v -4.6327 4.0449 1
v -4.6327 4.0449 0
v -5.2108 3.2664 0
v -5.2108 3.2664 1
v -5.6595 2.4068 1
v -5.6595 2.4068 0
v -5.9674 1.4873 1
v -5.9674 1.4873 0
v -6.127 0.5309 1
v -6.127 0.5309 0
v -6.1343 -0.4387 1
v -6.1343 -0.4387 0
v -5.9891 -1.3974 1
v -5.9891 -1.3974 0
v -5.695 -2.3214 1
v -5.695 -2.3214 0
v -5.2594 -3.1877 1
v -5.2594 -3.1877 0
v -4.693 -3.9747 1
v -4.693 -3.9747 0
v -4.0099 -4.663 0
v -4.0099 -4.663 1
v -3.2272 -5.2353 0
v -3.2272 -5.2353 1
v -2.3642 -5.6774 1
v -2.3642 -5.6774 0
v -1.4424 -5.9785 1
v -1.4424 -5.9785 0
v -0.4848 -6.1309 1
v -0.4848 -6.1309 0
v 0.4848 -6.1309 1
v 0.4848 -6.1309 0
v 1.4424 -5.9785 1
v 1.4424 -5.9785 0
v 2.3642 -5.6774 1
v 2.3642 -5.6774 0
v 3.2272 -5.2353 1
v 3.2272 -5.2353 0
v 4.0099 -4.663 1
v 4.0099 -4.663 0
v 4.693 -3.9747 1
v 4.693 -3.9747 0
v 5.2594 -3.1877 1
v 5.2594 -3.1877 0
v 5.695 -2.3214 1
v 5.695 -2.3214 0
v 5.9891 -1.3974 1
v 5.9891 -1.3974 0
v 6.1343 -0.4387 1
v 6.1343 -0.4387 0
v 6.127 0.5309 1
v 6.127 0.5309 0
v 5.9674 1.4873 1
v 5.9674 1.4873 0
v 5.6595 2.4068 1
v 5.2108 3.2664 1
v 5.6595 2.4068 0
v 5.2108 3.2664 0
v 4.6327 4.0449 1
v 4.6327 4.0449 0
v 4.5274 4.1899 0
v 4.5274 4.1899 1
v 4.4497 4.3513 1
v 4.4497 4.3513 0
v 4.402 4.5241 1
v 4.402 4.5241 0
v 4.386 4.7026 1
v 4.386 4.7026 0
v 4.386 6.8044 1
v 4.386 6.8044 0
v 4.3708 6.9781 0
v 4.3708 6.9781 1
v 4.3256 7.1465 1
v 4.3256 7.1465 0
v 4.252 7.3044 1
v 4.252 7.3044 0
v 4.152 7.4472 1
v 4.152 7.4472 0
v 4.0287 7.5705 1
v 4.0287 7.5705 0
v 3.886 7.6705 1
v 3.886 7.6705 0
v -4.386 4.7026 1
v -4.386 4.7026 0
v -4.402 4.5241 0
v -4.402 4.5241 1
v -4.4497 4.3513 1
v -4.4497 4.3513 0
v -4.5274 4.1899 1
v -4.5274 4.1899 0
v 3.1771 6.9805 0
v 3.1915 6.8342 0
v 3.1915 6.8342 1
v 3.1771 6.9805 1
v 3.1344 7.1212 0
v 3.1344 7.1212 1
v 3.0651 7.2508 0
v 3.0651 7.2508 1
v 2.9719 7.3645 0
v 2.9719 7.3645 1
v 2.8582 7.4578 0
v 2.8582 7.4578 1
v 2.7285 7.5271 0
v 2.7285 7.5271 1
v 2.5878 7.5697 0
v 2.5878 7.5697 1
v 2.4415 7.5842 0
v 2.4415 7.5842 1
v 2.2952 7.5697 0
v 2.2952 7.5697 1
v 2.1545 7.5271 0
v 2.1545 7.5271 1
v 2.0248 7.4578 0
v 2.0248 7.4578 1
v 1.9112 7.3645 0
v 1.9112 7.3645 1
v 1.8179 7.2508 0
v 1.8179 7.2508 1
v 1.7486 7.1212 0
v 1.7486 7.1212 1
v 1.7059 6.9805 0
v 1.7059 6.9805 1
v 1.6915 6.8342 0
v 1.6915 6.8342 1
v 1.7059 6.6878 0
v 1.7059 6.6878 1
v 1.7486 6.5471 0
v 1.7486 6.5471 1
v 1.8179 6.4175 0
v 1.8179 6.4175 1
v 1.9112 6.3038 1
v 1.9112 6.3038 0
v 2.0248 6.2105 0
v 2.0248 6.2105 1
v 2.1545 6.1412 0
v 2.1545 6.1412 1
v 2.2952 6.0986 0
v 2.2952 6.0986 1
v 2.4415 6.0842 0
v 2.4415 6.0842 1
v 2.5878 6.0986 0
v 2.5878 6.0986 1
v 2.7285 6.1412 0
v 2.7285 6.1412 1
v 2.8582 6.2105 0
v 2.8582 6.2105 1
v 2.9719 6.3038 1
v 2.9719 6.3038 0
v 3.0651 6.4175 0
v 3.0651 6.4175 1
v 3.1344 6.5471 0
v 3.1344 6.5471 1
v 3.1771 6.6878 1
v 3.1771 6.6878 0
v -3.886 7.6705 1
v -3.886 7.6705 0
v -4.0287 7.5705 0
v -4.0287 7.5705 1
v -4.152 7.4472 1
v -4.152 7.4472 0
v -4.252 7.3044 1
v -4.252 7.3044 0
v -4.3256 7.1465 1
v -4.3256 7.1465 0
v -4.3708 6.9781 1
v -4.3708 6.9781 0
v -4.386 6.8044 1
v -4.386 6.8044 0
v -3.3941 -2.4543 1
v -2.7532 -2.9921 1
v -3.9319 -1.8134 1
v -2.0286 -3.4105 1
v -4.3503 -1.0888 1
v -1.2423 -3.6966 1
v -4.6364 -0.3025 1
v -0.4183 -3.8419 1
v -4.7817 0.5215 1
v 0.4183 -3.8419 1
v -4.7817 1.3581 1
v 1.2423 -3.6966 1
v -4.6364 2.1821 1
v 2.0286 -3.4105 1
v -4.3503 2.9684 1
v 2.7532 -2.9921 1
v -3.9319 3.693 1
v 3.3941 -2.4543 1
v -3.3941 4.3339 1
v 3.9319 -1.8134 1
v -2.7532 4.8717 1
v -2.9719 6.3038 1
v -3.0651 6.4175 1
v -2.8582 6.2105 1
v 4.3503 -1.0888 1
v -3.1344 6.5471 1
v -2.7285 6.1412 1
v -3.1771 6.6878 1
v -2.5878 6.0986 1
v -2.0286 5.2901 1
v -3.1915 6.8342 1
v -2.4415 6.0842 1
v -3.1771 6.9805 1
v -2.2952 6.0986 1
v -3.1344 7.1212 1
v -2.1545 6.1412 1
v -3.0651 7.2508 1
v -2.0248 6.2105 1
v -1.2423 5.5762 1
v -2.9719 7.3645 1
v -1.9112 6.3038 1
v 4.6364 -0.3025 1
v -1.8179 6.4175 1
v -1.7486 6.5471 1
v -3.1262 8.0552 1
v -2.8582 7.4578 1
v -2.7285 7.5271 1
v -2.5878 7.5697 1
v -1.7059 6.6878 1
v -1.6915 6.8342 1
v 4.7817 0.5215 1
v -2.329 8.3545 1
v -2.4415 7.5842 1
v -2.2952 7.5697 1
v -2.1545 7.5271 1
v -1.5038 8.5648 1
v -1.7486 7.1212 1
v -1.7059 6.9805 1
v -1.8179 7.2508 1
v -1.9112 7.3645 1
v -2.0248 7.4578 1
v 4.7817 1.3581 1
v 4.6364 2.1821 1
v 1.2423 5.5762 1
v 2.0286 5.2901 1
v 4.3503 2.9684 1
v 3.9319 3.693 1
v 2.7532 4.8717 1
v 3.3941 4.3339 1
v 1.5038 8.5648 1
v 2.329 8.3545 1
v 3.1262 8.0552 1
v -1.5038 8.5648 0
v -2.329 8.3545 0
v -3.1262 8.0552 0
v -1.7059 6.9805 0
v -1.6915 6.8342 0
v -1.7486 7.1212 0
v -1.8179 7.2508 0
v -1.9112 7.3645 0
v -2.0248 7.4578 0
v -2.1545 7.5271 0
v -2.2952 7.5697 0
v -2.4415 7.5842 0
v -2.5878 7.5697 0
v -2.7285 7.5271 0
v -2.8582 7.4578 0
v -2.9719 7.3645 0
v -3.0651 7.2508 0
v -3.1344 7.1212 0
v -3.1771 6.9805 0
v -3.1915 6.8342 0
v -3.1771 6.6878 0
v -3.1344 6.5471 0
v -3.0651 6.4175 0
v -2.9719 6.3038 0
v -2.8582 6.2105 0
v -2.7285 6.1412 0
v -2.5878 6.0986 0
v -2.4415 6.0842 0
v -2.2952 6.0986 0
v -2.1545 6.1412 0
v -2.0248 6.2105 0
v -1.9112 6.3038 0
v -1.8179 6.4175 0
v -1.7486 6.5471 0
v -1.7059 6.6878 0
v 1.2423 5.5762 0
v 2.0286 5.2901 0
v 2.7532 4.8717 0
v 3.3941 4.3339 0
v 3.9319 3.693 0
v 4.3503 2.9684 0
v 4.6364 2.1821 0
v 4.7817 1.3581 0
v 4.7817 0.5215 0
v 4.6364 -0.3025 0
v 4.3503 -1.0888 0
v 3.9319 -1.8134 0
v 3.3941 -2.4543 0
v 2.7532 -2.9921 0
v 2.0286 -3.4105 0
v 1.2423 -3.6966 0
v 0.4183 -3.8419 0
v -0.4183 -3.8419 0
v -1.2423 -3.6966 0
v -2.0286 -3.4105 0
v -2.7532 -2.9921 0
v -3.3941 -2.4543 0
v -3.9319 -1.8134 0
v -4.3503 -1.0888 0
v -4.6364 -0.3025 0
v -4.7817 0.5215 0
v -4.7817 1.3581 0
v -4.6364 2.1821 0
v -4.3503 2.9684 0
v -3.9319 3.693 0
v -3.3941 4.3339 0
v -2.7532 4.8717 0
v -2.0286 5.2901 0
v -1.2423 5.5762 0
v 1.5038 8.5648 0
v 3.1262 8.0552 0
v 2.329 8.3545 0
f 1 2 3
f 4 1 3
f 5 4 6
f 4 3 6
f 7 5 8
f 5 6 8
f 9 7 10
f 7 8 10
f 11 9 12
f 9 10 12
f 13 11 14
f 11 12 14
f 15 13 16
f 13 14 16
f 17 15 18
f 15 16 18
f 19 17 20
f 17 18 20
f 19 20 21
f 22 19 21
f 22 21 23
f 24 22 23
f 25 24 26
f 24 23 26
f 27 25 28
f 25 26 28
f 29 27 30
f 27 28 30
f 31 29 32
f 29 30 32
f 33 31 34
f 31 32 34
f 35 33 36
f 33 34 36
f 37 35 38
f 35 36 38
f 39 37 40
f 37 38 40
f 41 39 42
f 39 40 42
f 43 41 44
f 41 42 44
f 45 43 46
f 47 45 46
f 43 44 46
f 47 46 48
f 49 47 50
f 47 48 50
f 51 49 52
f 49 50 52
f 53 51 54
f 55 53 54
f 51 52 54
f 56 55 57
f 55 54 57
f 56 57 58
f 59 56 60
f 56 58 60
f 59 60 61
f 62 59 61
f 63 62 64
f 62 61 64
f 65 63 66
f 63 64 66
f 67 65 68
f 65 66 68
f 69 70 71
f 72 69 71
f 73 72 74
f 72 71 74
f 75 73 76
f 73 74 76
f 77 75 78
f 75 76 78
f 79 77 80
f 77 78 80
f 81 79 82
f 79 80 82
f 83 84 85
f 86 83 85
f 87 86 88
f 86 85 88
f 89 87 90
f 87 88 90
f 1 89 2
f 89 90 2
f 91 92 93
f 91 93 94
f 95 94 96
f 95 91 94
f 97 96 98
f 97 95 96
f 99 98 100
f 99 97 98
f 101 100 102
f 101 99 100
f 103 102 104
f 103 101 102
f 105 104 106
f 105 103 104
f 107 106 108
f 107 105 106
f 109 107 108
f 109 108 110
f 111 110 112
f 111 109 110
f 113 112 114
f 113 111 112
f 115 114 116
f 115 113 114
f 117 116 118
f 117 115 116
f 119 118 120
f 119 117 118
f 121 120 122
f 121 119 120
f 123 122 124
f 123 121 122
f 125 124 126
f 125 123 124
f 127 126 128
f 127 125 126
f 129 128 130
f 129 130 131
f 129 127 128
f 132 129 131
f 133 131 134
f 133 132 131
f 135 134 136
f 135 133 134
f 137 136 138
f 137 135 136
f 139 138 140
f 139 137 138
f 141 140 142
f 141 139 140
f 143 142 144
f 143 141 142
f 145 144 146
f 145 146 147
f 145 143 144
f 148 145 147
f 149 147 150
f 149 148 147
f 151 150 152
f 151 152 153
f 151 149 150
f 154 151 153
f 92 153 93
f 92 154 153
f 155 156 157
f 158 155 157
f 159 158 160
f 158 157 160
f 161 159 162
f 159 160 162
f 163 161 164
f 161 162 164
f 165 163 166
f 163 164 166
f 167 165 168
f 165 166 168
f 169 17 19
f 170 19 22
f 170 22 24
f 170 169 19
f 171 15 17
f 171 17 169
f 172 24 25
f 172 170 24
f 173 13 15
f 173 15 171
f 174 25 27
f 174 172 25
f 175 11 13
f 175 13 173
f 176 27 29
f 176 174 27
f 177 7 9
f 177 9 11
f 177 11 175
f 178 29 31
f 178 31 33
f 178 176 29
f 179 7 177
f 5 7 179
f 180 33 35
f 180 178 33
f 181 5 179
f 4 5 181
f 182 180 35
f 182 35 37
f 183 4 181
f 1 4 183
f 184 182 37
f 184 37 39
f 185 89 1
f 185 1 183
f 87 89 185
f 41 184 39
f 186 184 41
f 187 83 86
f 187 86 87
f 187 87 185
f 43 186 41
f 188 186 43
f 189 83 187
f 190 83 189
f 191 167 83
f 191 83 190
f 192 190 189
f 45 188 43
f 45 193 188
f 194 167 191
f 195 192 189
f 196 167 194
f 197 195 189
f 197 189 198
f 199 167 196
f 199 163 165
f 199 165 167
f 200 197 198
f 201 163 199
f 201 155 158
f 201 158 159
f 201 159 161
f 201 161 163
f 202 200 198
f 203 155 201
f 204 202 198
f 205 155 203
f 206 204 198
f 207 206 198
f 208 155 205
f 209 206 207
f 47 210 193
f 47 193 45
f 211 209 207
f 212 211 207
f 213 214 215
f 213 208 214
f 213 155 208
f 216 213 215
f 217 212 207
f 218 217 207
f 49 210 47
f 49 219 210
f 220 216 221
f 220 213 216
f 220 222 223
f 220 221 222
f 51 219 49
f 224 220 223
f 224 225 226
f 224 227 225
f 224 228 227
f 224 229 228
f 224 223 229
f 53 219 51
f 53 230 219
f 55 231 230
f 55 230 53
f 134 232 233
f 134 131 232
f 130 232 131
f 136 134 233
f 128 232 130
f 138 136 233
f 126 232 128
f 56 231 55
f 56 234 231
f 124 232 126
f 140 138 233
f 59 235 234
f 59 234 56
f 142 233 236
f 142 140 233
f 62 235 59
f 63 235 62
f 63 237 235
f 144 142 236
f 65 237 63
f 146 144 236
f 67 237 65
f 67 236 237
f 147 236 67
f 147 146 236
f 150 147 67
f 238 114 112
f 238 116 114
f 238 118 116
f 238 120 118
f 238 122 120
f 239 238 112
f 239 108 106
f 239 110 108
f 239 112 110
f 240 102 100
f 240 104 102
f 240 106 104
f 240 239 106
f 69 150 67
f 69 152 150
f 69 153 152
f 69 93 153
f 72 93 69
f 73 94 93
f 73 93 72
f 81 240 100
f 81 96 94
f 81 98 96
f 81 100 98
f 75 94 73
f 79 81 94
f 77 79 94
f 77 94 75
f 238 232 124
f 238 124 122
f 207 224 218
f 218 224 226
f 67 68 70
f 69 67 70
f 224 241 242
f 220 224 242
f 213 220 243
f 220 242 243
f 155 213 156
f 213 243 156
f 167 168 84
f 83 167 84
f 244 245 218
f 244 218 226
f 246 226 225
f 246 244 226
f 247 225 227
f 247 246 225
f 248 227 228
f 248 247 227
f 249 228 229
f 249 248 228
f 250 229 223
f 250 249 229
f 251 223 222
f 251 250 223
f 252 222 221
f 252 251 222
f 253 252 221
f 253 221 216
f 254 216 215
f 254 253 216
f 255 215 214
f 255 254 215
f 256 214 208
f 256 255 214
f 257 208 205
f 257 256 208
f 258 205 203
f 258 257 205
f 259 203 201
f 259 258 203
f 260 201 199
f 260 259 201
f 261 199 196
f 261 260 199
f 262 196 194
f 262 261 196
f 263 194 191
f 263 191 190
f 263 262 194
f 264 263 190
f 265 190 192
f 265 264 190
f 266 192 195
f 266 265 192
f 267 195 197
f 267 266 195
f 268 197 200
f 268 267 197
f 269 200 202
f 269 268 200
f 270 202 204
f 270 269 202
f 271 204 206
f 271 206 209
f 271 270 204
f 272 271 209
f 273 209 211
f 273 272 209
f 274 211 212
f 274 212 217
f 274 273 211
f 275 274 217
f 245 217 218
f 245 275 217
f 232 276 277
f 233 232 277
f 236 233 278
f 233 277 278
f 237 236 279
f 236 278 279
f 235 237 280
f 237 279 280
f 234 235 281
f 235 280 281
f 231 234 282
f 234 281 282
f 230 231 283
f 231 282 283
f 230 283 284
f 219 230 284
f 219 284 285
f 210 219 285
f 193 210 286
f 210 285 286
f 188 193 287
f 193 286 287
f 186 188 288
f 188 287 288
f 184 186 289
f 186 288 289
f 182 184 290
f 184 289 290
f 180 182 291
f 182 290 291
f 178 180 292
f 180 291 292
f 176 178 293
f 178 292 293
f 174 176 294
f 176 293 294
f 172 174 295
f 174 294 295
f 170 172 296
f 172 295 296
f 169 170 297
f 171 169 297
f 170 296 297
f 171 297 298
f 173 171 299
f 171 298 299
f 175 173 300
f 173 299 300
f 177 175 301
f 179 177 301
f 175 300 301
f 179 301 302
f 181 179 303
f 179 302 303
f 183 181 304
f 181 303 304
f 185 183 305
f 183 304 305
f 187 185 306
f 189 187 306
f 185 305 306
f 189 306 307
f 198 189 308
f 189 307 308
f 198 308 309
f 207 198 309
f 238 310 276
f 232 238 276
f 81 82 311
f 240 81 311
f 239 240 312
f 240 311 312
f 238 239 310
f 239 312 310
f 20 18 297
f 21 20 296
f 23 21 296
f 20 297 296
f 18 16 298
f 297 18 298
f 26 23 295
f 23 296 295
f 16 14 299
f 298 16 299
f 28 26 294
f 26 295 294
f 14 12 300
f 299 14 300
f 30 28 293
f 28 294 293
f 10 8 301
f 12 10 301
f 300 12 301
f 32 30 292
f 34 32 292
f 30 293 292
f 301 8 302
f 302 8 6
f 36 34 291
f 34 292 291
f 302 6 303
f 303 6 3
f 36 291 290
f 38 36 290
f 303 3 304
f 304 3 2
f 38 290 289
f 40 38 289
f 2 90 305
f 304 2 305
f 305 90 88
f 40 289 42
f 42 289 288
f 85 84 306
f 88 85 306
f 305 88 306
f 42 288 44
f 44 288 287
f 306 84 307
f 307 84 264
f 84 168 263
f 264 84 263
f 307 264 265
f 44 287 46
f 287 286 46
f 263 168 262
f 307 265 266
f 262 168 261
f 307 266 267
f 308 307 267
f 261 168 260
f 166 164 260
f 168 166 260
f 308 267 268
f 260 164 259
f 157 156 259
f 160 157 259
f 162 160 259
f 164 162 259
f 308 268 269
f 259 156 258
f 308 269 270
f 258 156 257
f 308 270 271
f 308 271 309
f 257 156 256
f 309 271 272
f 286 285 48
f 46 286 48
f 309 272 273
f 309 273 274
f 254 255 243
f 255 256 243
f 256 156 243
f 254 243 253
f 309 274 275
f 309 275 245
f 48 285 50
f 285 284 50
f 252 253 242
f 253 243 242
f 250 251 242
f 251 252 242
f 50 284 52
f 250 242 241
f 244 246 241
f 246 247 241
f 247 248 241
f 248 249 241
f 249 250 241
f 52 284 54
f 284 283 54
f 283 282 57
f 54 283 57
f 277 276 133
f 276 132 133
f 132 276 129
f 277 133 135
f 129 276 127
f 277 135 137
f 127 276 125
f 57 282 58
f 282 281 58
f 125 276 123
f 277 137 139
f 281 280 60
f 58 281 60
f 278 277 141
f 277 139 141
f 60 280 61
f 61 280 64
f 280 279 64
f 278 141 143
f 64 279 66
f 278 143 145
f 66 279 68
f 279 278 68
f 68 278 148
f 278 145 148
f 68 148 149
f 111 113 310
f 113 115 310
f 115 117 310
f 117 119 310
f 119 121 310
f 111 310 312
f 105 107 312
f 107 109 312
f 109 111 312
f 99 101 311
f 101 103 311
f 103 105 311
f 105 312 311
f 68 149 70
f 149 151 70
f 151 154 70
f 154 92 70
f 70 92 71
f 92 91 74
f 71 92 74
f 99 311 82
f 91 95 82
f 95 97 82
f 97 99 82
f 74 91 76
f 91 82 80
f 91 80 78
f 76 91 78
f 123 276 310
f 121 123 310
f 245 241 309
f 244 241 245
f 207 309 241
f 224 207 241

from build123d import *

# Parameters (mm, degrees)
SKETCH1_R          = 0.75
BASE_EXTRUDE_DEPTH = 1


with BuildPart() as part:
    # Sketch1 → Base-Extrude (new body)
    with BuildSketch(Plane.XY):
        with BuildLine():
            Line((-4.385951083, 6.804439308), (-4.385951083, 4.702555787))
            ThreePointArc((-4.385951083, 4.702555787), (-4.449660564, 4.351329273), (-4.632671211, 4.044855677))
            ThreePointArc((-4.632671211, 4.044855677), (0, -6.15), (4.632671211, 4.044855677))
            ThreePointArc((4.632671211, 4.044855677), (4.449660564, 4.351329273), (4.385951083, 4.702555787))
            Line((4.385951083, 4.702555787), (4.385951083, 6.804439308))
            ThreePointArc((4.385951083, 6.804439308), (4.251976487, 7.304439308), (3.885951083, 7.670464712))
            ThreePointArc((3.885951083, 7.670464712), (2.731725093, 8.215797616), (1.503798645, 8.56482806))
            Line((1.503798645, 8.56482806), (1.242331416, 5.576243966))
            ThreePointArc((1.242331416, 5.576243966), (0, -3.8602), (-1.242331416, 5.576243966))
            Line((-1.242331416, 5.576243966), (-1.503798645, 8.56482806))
            ThreePointArc((-1.503798645, 8.56482806), (-2.731725093, 8.215797616), (-3.885951083, 7.670464712))
            ThreePointArc((-3.885951083, 7.670464712), (-4.251976487, 7.304439308), (-4.385951083, 6.804439308))
        make_face()
        with Locations((-2.441520298, 6.834151417)):
            Circle(SKETCH1_R, mode=Mode.SUBTRACT)
        with Locations((2.441520298, 6.834151417)):
            Circle(SKETCH1_R, mode=Mode.SUBTRACT)
    extrude(amount=BASE_EXTRUDE_DEPTH)


solid = part.part
